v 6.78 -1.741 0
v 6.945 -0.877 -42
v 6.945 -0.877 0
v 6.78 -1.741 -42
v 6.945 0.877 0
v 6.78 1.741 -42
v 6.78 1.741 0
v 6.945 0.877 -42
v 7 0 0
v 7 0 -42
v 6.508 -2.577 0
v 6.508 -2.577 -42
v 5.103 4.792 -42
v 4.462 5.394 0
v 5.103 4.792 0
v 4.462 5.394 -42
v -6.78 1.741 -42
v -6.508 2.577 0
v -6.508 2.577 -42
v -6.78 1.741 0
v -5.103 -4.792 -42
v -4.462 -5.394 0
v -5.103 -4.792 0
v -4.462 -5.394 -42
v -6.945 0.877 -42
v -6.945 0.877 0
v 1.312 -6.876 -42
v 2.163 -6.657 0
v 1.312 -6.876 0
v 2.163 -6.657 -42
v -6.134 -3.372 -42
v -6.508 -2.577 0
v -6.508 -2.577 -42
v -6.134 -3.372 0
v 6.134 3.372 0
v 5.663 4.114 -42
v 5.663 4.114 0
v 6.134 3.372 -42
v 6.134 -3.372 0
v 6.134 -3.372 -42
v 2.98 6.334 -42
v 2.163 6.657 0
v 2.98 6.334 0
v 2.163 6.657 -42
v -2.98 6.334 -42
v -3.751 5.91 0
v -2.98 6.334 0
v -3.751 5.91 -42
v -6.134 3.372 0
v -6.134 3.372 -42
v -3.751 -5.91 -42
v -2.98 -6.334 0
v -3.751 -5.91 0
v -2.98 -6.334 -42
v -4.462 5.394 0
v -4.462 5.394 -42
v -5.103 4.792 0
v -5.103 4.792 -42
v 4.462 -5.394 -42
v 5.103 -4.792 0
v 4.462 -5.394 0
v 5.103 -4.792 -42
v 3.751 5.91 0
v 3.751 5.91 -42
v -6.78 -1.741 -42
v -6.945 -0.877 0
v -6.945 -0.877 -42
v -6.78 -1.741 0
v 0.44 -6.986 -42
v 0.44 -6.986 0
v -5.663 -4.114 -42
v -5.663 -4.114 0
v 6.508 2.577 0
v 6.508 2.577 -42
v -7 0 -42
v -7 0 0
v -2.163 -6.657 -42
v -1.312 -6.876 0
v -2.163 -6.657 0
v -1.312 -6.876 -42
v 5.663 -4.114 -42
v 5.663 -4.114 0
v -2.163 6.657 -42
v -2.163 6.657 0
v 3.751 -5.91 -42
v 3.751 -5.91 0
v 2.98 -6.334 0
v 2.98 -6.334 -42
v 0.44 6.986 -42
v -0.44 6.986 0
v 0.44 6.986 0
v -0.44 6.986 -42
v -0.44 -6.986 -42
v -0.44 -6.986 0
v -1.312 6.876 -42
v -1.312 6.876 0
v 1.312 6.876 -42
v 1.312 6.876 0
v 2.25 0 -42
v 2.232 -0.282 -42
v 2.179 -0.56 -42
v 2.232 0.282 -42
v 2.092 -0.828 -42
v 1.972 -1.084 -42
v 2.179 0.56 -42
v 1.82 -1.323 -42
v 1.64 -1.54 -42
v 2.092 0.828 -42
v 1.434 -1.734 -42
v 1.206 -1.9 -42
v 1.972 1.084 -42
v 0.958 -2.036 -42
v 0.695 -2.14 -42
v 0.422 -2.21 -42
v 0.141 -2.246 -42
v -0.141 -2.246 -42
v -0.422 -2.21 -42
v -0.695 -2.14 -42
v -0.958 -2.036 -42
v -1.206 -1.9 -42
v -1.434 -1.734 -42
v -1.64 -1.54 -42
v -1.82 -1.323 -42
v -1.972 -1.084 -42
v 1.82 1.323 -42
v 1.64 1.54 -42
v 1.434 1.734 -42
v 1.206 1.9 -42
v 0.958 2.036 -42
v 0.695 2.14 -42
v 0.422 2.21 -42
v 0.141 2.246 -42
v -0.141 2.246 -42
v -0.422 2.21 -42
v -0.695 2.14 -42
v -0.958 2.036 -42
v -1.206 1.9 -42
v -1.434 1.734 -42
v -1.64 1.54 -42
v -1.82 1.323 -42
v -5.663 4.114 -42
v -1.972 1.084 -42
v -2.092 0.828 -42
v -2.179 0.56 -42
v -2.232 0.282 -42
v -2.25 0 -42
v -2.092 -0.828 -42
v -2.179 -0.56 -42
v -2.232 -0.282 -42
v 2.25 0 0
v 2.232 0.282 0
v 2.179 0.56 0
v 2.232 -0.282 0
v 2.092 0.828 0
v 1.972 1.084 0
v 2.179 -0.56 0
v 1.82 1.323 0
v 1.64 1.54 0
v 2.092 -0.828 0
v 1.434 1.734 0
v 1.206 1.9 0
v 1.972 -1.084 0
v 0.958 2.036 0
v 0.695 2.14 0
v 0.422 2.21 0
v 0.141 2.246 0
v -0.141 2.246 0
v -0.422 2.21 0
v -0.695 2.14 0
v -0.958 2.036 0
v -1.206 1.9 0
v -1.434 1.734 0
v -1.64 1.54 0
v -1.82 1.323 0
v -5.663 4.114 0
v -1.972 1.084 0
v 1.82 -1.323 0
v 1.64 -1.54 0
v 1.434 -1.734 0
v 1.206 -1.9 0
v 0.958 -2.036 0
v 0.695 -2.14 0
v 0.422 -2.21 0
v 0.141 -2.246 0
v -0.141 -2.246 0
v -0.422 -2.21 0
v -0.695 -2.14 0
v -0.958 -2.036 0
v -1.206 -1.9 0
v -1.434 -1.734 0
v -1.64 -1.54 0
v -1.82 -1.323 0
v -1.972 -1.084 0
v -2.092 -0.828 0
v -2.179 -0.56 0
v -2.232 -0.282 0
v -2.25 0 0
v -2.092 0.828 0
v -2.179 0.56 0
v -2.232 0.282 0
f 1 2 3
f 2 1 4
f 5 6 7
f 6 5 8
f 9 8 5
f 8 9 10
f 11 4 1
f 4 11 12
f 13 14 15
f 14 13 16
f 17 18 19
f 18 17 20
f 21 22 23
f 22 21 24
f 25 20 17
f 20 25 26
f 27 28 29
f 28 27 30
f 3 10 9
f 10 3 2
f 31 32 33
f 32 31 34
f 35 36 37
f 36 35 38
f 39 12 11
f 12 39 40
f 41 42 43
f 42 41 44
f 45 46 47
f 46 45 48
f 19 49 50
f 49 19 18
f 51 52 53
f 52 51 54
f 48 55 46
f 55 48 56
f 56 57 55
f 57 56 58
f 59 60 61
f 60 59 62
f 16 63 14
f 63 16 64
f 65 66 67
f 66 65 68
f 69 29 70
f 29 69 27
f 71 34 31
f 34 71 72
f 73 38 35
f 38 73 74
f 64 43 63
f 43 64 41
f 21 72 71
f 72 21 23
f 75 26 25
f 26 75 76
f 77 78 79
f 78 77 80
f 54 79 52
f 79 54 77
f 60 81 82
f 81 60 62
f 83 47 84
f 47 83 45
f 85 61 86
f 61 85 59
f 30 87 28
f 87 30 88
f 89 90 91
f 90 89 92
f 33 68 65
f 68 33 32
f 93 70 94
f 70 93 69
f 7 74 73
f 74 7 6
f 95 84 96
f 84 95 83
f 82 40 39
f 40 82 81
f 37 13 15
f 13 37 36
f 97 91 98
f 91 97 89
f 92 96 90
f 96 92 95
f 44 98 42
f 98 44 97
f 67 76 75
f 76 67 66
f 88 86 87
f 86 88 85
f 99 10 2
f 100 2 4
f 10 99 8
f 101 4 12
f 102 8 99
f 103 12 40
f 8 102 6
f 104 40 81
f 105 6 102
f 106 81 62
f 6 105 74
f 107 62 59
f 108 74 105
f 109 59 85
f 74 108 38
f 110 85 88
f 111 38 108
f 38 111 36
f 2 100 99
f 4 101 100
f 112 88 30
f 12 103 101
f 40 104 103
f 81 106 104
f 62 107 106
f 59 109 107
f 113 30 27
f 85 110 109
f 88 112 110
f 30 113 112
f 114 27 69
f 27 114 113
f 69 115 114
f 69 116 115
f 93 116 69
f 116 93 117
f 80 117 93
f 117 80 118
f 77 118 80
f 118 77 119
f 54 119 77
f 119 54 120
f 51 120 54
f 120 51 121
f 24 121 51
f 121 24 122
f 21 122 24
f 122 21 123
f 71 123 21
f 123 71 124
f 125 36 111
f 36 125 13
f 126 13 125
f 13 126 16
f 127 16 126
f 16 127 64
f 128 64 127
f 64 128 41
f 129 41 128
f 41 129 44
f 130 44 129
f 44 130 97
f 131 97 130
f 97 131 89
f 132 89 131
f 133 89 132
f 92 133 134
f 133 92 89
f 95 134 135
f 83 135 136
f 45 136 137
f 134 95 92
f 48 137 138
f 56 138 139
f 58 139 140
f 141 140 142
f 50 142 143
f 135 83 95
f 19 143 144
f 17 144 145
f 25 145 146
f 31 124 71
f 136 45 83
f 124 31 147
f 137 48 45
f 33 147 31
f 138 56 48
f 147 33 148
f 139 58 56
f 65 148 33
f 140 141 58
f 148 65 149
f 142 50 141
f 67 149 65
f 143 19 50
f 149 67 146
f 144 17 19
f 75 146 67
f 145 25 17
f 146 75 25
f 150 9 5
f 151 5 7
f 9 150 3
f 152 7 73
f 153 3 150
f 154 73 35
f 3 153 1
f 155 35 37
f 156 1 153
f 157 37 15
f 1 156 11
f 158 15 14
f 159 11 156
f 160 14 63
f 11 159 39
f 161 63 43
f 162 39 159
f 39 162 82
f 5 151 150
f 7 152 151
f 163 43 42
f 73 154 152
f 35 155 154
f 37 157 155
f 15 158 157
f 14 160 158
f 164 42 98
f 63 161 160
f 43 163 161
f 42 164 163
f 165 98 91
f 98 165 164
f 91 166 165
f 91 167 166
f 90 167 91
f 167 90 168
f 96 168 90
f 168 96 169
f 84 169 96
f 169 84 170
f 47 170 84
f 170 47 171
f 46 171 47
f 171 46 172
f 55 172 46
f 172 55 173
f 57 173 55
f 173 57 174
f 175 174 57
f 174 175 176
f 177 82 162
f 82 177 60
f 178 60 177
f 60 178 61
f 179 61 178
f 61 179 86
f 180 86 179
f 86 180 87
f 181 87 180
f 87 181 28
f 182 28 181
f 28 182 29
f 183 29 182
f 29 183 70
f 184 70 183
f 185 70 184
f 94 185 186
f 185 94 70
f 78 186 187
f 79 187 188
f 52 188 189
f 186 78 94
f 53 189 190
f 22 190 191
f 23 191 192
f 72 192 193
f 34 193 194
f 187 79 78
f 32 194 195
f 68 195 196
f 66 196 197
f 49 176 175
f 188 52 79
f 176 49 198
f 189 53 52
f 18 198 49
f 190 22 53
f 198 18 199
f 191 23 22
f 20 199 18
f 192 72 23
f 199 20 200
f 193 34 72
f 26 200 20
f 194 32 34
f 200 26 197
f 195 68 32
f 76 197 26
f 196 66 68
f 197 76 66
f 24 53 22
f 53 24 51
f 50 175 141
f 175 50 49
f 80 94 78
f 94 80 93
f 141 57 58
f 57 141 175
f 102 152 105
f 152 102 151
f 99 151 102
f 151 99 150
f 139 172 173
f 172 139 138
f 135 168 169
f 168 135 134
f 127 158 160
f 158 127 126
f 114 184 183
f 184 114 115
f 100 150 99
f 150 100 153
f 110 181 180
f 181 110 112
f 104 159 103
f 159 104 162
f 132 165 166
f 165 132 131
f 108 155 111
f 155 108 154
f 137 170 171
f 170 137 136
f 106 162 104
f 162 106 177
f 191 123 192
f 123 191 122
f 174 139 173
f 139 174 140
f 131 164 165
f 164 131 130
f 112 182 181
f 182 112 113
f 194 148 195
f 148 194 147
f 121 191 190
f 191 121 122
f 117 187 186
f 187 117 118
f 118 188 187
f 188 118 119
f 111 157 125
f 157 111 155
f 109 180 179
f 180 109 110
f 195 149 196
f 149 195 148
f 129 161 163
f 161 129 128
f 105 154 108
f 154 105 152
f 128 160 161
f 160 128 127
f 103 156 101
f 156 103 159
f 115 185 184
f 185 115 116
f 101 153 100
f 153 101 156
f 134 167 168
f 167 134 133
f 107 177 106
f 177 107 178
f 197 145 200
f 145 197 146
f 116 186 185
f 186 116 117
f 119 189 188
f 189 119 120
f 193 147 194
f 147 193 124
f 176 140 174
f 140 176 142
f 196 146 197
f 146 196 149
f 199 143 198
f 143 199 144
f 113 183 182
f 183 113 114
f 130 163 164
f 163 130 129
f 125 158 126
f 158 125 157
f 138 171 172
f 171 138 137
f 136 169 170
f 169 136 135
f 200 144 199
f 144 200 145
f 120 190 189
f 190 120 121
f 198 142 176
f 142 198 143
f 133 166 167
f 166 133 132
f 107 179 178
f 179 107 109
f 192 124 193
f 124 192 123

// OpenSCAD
$fn = 50;


difference() {
	union() {
		translate(v = [0, 0, -42.0000000000]) {
			cylinder(h = 42, r = 7.0000000000);
		}
		cylinder(h = 0, r = 16.0000000000);
	}
	union() {
		#translate(v = [0, 0, -42]) {
			cylinder(h = 42, r = 2.2500000000);
		}
	}
}
